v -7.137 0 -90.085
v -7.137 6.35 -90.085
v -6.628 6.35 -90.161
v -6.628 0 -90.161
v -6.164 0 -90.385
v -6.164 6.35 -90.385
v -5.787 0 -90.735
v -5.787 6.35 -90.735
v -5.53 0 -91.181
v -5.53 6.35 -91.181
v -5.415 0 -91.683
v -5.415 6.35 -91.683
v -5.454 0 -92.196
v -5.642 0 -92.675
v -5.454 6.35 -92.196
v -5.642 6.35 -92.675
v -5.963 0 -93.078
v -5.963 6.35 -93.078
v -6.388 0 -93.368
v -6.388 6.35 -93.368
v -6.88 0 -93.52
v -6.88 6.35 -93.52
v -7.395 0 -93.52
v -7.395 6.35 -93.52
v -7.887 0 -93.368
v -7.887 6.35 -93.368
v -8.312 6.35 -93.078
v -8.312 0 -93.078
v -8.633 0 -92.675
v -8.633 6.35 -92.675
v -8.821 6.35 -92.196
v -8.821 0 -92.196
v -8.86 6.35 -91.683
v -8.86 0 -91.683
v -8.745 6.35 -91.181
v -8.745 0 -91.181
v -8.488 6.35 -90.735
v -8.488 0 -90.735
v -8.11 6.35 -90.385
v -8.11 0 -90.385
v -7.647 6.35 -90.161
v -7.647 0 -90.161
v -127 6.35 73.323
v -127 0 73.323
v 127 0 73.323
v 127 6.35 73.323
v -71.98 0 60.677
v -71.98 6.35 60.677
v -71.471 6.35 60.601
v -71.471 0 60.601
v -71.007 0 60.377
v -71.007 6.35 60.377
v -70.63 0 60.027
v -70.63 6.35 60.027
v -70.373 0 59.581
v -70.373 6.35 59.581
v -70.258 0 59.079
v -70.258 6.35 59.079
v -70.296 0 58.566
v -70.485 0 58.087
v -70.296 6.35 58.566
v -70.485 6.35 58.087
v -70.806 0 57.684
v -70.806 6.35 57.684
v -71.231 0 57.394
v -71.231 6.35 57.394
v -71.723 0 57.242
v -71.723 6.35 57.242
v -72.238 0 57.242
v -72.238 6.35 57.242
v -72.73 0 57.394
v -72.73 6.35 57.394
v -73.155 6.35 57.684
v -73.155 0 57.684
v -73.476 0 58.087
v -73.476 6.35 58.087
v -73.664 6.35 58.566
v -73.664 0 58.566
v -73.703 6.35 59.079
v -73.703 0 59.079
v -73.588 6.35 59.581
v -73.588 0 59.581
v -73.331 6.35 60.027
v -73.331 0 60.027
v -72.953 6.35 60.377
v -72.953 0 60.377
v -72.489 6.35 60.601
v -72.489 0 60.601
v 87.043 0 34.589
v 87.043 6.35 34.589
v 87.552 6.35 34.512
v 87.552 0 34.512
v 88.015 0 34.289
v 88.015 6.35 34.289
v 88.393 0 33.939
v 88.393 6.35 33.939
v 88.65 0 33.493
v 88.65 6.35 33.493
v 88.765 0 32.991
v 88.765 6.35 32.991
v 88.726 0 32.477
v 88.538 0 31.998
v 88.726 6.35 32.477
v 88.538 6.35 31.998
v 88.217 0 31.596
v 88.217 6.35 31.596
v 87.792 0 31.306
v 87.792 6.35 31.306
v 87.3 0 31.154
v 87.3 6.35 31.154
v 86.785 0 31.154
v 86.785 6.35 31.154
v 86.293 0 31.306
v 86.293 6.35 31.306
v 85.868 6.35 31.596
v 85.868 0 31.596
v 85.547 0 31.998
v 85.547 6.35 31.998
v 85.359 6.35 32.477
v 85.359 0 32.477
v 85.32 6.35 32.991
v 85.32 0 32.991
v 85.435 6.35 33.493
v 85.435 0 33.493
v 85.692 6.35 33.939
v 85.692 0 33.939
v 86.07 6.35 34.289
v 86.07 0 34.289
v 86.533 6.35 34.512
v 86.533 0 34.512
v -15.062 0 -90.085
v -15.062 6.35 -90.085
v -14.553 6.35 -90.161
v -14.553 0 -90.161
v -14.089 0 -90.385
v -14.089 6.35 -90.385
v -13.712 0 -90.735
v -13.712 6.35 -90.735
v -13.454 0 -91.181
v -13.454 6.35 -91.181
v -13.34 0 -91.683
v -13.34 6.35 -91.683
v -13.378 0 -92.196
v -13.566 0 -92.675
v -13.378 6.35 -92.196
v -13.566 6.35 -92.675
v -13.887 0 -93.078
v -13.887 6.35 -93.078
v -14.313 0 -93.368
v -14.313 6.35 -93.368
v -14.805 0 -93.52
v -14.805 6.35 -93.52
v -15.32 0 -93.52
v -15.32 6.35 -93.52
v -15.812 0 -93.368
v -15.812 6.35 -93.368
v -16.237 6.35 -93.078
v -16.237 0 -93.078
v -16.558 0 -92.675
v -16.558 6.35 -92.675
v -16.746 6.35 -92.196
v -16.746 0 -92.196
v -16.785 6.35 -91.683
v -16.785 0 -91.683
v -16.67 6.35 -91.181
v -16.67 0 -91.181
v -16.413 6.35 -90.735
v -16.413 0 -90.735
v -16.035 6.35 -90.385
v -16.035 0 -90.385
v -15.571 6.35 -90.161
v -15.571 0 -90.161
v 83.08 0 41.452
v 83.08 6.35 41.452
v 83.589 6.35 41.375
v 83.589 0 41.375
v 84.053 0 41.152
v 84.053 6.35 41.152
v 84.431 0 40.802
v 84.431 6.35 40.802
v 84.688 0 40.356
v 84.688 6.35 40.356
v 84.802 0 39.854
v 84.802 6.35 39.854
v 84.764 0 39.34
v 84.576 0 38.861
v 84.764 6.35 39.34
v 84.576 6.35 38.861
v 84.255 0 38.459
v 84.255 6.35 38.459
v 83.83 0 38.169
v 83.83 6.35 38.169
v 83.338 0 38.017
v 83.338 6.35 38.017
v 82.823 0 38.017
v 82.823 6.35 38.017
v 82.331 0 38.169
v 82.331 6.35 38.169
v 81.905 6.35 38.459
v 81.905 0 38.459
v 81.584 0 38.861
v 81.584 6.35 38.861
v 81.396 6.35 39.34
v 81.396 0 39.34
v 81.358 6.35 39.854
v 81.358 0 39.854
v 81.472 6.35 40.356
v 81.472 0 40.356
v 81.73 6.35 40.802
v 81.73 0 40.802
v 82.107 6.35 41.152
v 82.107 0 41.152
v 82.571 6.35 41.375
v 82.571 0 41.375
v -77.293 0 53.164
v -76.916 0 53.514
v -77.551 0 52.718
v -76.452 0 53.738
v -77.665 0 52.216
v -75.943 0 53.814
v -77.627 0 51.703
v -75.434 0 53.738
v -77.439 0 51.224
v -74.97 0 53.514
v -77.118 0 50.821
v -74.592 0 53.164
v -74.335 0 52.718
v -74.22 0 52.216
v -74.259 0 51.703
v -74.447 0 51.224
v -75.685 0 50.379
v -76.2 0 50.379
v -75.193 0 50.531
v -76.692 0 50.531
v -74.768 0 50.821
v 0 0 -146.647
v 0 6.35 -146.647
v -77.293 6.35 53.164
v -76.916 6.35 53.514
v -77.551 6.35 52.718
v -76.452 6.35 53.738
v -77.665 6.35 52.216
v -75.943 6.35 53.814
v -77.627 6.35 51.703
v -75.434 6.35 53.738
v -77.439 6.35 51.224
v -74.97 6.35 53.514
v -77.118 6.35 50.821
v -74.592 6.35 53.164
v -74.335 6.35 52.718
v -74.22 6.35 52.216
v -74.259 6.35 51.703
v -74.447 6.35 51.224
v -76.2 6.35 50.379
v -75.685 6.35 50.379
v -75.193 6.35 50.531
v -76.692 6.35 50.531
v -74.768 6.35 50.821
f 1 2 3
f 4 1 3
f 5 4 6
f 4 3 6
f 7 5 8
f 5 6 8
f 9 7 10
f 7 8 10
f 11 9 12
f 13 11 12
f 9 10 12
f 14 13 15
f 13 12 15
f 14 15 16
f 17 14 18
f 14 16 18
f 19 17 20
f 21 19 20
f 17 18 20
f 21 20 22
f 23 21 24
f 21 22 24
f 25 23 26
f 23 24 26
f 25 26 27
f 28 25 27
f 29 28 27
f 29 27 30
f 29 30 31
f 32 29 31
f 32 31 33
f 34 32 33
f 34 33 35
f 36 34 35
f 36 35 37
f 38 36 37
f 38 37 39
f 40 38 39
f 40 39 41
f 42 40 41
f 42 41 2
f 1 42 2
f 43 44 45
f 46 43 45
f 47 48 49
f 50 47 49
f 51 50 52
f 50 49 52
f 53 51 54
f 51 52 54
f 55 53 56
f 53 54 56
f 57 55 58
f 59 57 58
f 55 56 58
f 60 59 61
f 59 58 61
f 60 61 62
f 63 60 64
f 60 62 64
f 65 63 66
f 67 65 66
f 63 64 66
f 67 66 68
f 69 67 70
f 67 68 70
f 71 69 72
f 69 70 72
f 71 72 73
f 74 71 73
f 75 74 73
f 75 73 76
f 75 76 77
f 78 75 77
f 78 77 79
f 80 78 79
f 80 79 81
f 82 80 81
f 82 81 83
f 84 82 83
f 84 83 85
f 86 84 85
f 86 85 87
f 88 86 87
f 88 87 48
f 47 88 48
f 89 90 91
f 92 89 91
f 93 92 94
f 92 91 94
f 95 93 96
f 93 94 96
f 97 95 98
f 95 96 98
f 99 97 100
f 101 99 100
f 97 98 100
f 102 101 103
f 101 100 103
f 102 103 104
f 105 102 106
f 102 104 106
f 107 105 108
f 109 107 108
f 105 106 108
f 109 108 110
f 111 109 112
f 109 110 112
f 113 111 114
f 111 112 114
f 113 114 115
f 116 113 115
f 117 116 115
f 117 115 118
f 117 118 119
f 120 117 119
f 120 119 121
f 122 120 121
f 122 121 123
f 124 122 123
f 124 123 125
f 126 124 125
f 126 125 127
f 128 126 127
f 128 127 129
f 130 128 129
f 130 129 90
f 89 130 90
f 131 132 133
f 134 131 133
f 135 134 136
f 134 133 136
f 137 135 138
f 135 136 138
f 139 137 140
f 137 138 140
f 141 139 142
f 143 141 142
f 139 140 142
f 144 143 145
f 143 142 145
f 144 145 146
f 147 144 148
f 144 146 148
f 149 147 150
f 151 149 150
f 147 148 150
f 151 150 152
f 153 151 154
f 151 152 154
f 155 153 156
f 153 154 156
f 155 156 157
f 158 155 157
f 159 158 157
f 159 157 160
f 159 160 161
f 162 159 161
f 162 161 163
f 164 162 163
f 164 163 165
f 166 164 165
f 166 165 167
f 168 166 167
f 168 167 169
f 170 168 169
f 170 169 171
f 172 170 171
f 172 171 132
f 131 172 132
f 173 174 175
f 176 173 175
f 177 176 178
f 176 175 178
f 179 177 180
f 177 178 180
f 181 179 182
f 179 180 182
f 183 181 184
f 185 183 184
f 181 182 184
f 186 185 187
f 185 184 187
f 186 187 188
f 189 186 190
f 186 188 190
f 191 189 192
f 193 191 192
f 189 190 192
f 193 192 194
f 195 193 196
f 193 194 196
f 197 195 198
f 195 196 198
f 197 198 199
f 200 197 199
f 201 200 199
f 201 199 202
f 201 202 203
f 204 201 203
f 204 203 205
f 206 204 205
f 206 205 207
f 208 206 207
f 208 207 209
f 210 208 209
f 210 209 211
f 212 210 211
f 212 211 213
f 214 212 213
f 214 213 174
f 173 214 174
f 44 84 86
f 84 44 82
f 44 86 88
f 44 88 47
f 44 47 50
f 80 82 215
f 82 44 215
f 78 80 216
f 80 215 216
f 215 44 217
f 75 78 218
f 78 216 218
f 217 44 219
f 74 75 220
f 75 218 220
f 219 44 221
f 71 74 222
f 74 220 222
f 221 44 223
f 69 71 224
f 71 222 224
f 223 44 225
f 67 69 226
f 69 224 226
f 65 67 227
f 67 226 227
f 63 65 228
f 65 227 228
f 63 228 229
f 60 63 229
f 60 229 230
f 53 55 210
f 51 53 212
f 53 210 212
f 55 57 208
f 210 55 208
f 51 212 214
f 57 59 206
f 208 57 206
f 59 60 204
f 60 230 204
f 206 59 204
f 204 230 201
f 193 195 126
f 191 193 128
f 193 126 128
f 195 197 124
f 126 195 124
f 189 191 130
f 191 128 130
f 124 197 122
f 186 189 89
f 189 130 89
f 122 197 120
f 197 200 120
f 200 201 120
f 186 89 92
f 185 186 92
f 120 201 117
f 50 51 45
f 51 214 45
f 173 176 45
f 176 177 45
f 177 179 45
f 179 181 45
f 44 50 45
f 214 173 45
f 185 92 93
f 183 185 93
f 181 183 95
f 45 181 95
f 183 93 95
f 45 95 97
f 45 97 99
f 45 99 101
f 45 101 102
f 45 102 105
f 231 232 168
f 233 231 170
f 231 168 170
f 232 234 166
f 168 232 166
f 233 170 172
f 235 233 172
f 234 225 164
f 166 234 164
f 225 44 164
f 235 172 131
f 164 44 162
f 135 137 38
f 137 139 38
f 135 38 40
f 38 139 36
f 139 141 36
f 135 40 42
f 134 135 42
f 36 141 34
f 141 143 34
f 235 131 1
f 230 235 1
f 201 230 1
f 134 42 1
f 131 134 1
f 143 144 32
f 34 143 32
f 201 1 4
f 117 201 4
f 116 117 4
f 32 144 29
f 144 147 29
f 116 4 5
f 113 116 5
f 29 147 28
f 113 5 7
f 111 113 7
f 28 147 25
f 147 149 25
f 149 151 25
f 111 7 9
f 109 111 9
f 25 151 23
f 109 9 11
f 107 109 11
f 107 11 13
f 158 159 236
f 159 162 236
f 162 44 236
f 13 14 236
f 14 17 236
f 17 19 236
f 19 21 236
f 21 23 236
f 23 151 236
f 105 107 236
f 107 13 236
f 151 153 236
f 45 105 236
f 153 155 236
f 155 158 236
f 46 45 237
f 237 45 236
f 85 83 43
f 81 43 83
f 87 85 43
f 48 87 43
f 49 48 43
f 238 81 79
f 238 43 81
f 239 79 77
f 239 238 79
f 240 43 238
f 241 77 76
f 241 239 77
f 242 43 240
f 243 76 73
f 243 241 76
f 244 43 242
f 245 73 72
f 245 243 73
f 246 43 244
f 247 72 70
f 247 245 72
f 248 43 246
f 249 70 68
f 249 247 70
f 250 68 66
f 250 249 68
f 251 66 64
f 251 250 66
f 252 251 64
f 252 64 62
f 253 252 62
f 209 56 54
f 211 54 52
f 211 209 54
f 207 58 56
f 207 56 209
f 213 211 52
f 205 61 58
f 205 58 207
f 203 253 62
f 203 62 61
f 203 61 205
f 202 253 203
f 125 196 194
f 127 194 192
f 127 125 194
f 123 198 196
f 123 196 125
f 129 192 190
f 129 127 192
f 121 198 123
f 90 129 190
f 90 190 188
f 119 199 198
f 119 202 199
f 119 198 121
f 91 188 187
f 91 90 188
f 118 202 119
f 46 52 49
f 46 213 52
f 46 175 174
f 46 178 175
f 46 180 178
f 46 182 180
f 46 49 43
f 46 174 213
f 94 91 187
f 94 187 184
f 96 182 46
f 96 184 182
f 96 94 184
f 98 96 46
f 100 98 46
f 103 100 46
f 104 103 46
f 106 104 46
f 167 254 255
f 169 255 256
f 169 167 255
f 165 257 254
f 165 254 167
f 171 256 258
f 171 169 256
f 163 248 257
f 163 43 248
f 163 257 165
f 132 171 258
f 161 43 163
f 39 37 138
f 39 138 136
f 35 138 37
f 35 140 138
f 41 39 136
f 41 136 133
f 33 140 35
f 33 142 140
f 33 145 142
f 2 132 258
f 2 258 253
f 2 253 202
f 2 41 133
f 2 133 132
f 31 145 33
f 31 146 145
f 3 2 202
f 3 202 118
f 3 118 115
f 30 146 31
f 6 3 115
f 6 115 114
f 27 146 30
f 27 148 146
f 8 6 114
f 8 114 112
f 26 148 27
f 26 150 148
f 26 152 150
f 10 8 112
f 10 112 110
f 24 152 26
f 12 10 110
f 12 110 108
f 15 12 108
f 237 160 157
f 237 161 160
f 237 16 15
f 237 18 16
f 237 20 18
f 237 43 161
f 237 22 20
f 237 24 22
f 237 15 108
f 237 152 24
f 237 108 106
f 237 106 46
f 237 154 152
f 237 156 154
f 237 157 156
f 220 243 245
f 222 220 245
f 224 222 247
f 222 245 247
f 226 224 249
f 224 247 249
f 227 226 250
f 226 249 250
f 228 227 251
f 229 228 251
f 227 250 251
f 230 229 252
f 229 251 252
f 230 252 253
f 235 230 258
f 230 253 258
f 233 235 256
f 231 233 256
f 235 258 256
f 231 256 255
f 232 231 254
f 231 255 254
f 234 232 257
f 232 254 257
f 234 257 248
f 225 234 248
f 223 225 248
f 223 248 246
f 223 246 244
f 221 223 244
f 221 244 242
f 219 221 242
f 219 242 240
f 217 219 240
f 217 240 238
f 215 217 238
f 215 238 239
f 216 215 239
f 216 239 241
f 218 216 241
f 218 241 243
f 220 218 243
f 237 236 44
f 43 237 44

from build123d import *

# Parameters (mm, degrees)
BOSS_EXTRUDE1_DEPTH = 6.35
SKETCH2_R           = 1.7272
CUT_EXTRUDE1_DEPTH  = 195.099602868


with BuildPart() as part:
    # Sketch1 → Boss-Extrude1 (new body)
    with BuildSketch(Plane(origin=(0, 0, 0), x_dir=(1, 0, 0), z_dir=(0, 1, 0))):
        Polygon((0, 146.646968374), (-127, -73.323484187), (127, -73.323484187), align=None)
    extrude(amount=BOSS_EXTRUDE1_DEPTH)

    # Sketch2 → Cut-Extrude1 (cut, through all)
    with BuildSketch(Plane(origin=(0, 6.35, 0), x_dir=(1, 0, 0), z_dir=(0, 1, 0))):
        with Locations((83.080121807, -39.724771067)):
            Circle(SKETCH2_R)
        with Locations((87.042521807, -32.861692947)):
            Circle(SKETCH2_R)
        with Locations((-75.942721807, -52.087110501)):
            Circle(SKETCH2_R)
        with Locations((-71.980321807, -58.950188621)):
            Circle(SKETCH2_R)
        with Locations((-7.1374, 91.811881567)):
            Circle(SKETCH2_R)
        with Locations((-15.0622, 91.811881567)):
            Circle(SKETCH2_R)
    extrude(amount=-CUT_EXTRUDE1_DEPTH, mode=Mode.SUBTRACT)


solid = part.part
